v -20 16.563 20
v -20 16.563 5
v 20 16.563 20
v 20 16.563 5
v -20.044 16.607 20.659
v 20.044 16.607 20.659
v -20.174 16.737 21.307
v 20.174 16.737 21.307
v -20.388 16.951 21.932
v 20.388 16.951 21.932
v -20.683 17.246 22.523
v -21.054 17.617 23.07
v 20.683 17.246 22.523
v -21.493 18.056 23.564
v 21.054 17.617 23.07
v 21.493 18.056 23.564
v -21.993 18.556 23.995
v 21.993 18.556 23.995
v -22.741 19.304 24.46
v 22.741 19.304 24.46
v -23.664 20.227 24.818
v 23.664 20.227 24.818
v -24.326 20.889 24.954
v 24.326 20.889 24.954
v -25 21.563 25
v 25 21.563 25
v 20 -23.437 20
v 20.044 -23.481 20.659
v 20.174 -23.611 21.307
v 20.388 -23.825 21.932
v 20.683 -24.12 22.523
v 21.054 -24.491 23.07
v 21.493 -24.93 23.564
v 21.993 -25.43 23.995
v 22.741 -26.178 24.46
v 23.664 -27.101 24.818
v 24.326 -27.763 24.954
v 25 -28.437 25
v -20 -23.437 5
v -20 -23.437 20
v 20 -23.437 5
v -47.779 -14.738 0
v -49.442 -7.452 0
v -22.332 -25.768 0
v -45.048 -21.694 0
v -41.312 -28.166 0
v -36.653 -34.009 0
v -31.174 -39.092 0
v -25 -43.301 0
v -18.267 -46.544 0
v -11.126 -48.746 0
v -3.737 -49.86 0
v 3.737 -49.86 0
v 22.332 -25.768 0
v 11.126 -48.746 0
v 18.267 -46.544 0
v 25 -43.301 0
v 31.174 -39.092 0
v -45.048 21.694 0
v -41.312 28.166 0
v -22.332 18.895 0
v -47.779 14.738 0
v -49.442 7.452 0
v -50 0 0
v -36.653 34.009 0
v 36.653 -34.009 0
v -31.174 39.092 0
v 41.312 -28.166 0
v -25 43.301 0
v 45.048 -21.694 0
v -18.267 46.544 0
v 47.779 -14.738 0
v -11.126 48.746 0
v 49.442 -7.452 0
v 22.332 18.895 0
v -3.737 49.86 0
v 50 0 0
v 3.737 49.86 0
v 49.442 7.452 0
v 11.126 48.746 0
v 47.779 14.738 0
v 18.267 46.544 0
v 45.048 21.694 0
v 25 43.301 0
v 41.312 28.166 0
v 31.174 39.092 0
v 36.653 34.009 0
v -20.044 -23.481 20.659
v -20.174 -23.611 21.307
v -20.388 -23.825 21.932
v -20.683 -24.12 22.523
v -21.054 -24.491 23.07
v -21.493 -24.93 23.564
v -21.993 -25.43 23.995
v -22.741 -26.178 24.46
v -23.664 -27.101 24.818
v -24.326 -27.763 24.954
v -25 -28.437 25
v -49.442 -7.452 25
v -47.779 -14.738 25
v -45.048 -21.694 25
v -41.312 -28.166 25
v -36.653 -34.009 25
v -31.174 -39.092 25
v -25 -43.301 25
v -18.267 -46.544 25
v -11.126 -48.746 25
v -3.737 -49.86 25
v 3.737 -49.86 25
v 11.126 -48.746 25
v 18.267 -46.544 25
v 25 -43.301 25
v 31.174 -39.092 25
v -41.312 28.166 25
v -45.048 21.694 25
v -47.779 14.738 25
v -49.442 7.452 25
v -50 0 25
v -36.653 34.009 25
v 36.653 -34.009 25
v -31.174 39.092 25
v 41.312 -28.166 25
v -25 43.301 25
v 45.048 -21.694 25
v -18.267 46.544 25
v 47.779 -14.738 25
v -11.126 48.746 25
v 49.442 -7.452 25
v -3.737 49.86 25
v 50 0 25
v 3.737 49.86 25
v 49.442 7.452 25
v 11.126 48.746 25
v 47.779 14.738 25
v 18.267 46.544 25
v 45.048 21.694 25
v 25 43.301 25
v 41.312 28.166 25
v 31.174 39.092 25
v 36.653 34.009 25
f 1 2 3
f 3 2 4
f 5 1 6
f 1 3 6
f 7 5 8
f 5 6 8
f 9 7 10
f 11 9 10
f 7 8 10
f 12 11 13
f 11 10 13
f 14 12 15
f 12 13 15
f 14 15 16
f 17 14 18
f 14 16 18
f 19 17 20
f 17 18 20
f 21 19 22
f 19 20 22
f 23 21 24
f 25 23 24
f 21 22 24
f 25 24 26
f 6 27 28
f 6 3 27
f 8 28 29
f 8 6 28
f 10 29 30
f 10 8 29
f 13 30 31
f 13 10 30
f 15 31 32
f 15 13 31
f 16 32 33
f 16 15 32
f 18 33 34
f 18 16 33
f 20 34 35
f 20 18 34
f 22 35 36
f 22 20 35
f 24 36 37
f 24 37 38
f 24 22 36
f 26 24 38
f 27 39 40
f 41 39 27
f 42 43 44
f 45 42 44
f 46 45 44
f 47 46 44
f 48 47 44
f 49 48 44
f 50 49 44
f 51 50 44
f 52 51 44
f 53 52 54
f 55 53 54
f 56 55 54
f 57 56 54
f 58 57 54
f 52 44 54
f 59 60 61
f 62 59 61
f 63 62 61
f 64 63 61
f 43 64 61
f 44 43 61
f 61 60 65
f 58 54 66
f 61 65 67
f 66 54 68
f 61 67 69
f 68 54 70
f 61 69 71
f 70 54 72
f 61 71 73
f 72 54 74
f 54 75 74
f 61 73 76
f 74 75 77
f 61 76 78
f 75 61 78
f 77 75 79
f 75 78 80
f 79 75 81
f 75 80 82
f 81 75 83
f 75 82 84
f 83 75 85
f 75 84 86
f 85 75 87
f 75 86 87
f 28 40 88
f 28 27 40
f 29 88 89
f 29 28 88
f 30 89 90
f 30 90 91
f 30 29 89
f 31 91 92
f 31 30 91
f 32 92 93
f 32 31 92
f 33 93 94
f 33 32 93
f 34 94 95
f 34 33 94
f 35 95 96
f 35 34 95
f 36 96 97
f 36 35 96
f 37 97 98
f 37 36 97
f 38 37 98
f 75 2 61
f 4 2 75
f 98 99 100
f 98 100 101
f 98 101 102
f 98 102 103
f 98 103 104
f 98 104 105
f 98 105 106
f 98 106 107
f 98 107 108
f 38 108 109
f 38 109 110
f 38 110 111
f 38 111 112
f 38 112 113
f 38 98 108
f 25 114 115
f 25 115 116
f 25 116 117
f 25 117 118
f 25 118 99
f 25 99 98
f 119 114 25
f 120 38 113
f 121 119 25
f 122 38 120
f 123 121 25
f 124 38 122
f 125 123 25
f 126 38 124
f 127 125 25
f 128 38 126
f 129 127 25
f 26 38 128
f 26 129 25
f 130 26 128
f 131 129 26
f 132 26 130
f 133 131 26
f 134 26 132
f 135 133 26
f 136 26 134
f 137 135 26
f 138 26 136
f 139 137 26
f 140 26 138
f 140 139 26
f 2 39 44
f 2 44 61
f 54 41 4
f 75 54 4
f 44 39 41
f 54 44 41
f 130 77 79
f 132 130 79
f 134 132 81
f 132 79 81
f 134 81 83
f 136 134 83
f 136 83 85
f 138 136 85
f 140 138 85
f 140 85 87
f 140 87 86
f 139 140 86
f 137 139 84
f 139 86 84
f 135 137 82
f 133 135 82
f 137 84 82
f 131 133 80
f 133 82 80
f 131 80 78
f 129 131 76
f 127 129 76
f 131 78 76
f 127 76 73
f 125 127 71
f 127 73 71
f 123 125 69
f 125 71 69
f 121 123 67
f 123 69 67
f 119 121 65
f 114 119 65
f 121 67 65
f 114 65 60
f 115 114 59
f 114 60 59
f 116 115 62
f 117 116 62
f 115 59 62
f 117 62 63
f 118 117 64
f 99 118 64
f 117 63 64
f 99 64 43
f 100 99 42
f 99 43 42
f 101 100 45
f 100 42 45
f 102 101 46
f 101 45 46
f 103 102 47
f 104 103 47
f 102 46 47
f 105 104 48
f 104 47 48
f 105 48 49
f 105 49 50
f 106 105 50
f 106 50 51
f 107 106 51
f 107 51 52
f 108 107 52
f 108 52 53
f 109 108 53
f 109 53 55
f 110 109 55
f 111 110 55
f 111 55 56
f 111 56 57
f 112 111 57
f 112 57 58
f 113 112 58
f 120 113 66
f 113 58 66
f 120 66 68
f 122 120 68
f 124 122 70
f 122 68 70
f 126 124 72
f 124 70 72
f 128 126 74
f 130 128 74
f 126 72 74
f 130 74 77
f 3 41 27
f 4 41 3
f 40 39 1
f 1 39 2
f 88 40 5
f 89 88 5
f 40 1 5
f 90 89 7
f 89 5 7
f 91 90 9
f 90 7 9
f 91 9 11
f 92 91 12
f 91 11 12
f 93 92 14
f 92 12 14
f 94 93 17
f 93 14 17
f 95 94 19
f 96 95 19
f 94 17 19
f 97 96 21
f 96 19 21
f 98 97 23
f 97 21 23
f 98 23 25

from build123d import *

# Parameters (mm, degrees)
F0_R     = 50
F0_W     = 40
F0_H     = 40
F1_DEPTH = 25
F2_R     = 5
F3_SIZE2 = 5
F3_SIZE  = 2.3315382908


with BuildPart() as f1:
    # F0 (on Top) → F1 (new body)
    with BuildSketch(Plane.XY):
        Circle(F0_R)
        with Locations((0, -3.4369069617)):
            Rectangle(F0_W, F0_H, mode=Mode.SUBTRACT)
    extrude(amount=F1_DEPTH)

    # F2
    f2_edges = [f1.edges().sort_by_distance(p)[0] for p in [
        (0, 16.563093, 25),
        (-20, -3.436907, 25),
        (20, -3.436907, 25),
        (0, -23.436907, 25),
    ]]
    fillet(f2_edges, radius=F2_R)

    # F3
    f3_edges = [f1.edges().sort_by_distance(p)[0] for p in [
        (0, -23.436907, 0),
        (-20, -3.436907, 0),
        (0, 16.563093, 0),
        (20, -3.436907, 0),
    ]]
    f3_side = f1.faces().sort_by_distance((-48.585786, 0, 0))[0]
    chamfer(f3_edges, length=F3_SIZE, length2=F3_SIZE2, reference=f3_side)


solid = f1.part
